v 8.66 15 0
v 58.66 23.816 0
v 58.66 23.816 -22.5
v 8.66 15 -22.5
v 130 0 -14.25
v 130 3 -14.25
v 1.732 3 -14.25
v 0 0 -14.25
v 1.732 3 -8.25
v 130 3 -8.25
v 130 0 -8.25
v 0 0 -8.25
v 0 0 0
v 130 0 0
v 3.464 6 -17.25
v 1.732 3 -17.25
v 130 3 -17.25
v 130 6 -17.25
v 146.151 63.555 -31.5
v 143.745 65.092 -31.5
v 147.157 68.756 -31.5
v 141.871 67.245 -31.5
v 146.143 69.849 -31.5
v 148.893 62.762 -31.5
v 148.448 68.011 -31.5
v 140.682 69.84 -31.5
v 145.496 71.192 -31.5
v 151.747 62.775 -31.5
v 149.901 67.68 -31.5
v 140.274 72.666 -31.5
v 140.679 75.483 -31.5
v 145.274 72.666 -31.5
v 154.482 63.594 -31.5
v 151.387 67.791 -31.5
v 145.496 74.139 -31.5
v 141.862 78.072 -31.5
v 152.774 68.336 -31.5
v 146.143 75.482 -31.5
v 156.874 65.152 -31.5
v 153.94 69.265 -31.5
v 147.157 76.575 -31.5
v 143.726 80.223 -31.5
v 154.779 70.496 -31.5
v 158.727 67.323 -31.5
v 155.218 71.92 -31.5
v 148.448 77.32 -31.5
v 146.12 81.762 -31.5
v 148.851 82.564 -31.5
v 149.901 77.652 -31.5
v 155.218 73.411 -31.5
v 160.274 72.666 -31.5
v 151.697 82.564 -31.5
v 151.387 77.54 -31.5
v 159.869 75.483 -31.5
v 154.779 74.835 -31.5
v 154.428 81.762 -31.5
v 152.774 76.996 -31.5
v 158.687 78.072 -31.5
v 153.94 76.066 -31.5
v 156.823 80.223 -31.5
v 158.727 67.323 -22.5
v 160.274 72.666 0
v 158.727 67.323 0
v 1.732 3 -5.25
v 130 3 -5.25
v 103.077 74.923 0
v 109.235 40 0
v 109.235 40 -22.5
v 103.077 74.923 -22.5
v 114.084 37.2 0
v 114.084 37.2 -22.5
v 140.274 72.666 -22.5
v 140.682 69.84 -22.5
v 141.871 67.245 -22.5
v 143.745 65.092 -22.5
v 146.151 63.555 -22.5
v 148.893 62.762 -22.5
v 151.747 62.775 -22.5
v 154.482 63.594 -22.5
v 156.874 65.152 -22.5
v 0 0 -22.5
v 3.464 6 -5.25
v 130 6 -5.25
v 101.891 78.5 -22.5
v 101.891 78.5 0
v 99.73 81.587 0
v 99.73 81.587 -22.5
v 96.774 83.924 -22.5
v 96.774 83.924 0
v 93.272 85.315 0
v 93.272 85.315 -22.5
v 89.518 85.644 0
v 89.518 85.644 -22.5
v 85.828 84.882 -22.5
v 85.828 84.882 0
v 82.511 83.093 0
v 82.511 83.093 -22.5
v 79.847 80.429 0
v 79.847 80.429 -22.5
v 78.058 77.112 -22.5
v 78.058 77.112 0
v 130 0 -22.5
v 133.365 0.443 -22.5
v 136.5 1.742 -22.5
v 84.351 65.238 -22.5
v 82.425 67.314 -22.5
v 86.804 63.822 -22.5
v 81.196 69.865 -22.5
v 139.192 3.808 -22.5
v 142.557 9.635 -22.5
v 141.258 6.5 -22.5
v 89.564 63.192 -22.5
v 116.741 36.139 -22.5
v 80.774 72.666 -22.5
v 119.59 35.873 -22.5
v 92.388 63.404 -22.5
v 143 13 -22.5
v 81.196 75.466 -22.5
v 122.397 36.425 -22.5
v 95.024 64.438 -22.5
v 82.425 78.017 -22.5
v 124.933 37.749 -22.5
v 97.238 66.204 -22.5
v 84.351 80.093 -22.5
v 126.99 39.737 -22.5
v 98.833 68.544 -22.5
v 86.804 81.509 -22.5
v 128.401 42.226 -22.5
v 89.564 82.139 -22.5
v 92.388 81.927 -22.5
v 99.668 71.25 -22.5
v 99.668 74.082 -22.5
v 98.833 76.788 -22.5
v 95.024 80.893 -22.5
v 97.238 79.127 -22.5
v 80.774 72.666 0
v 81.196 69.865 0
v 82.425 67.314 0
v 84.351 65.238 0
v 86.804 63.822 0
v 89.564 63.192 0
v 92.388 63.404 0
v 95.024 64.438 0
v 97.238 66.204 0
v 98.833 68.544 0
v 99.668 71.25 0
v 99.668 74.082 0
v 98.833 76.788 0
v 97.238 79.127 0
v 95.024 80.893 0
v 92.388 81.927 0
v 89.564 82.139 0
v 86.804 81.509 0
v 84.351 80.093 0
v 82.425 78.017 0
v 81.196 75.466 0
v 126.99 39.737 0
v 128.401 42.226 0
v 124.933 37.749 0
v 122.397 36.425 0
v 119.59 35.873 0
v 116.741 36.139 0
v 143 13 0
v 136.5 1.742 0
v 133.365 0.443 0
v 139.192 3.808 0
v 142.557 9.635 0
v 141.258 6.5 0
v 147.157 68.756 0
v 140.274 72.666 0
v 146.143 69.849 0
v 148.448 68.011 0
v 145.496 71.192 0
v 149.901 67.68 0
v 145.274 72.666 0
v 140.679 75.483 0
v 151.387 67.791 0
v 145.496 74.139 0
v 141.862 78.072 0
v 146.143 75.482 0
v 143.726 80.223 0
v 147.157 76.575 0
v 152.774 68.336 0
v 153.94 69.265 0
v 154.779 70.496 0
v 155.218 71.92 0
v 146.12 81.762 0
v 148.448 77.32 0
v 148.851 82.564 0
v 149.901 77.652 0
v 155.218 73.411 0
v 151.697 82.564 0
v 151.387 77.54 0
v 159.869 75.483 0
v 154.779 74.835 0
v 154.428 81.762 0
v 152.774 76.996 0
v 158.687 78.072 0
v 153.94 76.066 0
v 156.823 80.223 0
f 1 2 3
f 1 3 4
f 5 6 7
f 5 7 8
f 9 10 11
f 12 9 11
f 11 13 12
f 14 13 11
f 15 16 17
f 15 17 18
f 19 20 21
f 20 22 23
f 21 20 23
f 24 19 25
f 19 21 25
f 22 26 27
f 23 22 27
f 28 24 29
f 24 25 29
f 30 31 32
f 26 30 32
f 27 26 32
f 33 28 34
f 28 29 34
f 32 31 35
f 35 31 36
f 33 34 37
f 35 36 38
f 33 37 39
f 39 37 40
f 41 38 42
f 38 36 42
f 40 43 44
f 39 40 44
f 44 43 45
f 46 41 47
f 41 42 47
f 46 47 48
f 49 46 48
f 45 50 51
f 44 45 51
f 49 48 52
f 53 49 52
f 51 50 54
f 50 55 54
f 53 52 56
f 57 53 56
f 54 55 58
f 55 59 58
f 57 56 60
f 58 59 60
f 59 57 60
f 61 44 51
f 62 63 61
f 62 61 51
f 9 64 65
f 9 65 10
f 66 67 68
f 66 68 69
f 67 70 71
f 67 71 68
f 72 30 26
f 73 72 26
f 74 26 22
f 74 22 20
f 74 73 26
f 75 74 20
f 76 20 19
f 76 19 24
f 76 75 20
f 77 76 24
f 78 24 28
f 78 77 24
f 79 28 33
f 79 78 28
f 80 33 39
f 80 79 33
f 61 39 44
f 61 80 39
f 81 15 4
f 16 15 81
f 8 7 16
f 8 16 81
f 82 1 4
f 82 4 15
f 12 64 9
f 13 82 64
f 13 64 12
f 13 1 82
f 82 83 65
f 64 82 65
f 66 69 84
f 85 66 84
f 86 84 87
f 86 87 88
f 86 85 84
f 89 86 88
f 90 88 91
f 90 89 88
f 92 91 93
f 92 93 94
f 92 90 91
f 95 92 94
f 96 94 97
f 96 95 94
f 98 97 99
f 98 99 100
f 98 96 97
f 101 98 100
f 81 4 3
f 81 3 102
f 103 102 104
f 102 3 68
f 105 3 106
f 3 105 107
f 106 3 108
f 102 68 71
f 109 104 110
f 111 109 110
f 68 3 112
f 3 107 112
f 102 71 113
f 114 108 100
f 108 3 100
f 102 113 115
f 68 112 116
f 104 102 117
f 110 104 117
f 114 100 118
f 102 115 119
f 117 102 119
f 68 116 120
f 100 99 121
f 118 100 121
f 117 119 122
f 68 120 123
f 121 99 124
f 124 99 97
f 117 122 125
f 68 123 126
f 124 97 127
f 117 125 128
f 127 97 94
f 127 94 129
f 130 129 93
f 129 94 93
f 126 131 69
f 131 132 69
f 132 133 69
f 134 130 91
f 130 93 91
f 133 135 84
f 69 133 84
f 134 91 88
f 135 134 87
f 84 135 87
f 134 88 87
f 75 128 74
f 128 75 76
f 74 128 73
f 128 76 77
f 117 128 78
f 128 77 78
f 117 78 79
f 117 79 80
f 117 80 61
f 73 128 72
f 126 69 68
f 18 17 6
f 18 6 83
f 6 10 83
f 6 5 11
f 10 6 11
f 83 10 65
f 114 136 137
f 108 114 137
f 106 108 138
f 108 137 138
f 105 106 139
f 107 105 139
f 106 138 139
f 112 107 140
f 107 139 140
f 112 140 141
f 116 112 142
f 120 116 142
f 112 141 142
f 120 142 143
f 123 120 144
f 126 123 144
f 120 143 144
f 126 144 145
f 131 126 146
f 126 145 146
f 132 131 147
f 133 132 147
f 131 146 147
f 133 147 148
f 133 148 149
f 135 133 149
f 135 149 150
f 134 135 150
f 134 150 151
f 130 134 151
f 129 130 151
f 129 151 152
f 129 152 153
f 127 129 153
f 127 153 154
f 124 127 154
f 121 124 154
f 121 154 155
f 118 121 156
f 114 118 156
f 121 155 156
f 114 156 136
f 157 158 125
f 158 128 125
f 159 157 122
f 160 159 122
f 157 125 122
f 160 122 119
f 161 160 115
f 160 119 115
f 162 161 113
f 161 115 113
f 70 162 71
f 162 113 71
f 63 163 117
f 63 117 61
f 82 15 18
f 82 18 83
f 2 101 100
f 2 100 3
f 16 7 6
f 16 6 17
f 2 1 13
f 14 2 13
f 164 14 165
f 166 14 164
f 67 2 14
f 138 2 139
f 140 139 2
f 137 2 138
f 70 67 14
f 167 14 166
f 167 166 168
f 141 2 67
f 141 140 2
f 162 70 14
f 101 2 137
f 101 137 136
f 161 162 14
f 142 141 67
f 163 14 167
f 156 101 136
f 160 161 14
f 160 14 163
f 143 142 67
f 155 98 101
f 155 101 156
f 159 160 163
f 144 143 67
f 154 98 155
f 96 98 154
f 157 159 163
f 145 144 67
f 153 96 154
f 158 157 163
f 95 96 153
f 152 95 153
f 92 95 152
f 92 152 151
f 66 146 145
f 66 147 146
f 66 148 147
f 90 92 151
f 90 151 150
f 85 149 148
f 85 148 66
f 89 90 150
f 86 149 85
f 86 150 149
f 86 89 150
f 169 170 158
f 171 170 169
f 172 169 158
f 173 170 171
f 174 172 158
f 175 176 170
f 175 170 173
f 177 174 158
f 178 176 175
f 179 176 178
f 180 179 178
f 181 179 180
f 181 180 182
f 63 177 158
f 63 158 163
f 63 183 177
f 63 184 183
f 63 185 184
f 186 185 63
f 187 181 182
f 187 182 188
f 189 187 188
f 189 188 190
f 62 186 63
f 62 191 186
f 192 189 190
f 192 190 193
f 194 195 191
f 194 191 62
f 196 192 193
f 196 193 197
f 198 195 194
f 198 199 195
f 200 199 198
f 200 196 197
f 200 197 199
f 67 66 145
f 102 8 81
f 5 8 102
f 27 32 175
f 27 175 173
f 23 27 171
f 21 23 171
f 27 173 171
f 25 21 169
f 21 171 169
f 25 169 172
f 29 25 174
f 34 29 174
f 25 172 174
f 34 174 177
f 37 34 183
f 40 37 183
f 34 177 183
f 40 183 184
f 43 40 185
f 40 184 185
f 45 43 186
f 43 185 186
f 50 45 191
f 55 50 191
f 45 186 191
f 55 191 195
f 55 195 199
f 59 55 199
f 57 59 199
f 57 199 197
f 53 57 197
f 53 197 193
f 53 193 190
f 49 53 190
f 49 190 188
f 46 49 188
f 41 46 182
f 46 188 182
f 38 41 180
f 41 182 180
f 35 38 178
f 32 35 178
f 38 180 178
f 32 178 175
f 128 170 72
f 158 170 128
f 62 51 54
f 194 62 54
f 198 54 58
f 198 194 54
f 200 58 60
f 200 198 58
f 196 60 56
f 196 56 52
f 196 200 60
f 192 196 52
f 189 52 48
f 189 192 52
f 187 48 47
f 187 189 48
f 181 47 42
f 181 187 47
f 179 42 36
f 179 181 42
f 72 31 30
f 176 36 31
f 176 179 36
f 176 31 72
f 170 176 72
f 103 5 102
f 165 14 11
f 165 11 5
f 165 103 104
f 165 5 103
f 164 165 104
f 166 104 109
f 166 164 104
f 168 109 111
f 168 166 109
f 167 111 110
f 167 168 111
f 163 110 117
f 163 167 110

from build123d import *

# Parameters (mm, degrees)
SKETCH1_R           = 13
SKETCH1_R_2         = 9.5
SKETCH1_R_3         = 5
BOSS_EXTRUDE1_DEPTH = 22.5
SKETCH6_W           = 3
SKETCH6_H           = 3
CUT_EXTRUDE2_DEPTH  = 130
FILLET1_R           = 10
SKETCH7_R           = 5
BOSS_EXTRUDE2_DEPTH = 9


with BuildPart() as part:
    # Sketch1 → Boss-Extrude1 (new body)
    # profile 1 of 7: a face of its own
    with BuildSketch(Plane.XY):
        with BuildLine():
            ThreePointArc((103.274249999, 72.665631876), (88.01682369, 59.863131087), (78.058245929, 77.11189374))
            Line((78.058245929, 77.11189374), (58.660254038, 23.816349035))
            Line((58.660254038, 23.816349035), (8.660254038, 15))
            Line((8.660254038, 15), (0, 0))
            Line((0, 0), (130, 0))
            ThreePointArc((130, 0), (120.807611845, 3.807611845), (117, 13))
            ThreePointArc((117, 13), (117.888810571, 17.724308479), (120.433706247, 21.802614602))
            Line((120.433706247, 21.802614602), (124.168764572, 31.377772343))
            Line((124.168764572, 31.377772343), (109.234628196, 40))
            Line((109.234628196, 40), (103.076750789, 74.923058186))
            ThreePointArc((103.076750789, 74.923058186), (103.224781075, 73.798656532), (103.274249999, 72.665631876))
        make_face()
    # profile 2 of 7: a face of its own
    with BuildSketch(Plane.XY):
        with Locations((90.274249999, 72.665631876)):
            Circle(SKETCH1_R)
        with Locations(Location((90.274249999, 72.665631876, 0), (0, 0, 180))):
            Circle(SKETCH1_R_2, mode=Mode.SUBTRACT)
    # profile 3 of 7: a face of its own
    with BuildSketch(Plane.XY):
        with BuildLine():
            Line((136.5, 24.258330249), (124.168764572, 31.377772343))
            Line((124.168764572, 31.377772343), (120.433706247, 21.802614602))
            ThreePointArc((120.433706247, 21.802614602), (128.035776443, 25.850751955), (136.5, 24.258330249))
        make_face()
    # profile 4 of 7: a face of its own
    with BuildSketch(Plane.XY):
        with BuildLine():
            ThreePointArc((117, 13), (120.807611845, 3.807611845), (130, 0))
            ThreePointArc((130, 0), (139.192388155, 3.807611845), (143, 13))
            ThreePointArc((143, 13), (141.258330249, 19.5), (136.5, 24.258330249))
            ThreePointArc((136.5, 24.258330249), (128.035776443, 25.850751955), (120.433706247, 21.802614602))
            Line((120.433706247, 21.802614602), (117, 13))
        make_face()
    # profile 5 of 7: a face of its own
    with BuildSketch(Plane.XY):
        with BuildLine():
            Line((117, 13), (120.433706247, 21.802614602))
            ThreePointArc((120.433706247, 21.802614602), (117.888810571, 17.724308479), (117, 13))
        make_face()
    # profile 6 of 7: a face of its own
    with BuildSketch(Plane.XY):
        with BuildLine():
            Line((140.274249999, 72.665631876), (124.168764572, 31.377772343))
            Line((124.168764572, 31.377772343), (136.5, 24.258330249))
            ThreePointArc((136.5, 24.258330249), (141.258330249, 19.5), (143, 13))
            Line((143, 13), (158.72749128, 67.323093917))
            ThreePointArc((158.72749128, 67.323093917), (147.493280097, 63.060101886), (140.274249999, 72.665631876))
        make_face()
    # profile 7 of 7: a face of its own
    with BuildSketch(Plane.XY):
        with BuildLine():
            ThreePointArc((160.274249999, 72.665631876), (150.274249999, 82.665631876), (140.274249999, 72.665631876))
            ThreePointArc((140.274249999, 72.665631876), (147.493280097, 63.060101886), (158.72749128, 67.323093917))
            Line((158.72749128, 67.323093917), (160.274249999, 72.665631876))
        make_face()
        with Locations(Location((150.274249999, 72.665631876, 0), (0, 0, 180))):
            Circle(SKETCH1_R_3, mode=Mode.SUBTRACT)
    extrude(amount=BOSS_EXTRUDE1_DEPTH)

    # Sketch6 → Cut-Extrude2 (cut)
    with BuildSketch(Plane(origin=(0, 0, 0), x_dir=(0, 0, -1), z_dir=(-1, 0, 0))):
        with Locations((-9.75, -1.5)):
            Rectangle(SKETCH6_W, SKETCH6_H)
        Polygon((-8.25, -3), (-11.25, -3), (-11.25, -6), (-5.25, -6), (-5.25, -3), align=None)
        with Locations((-12.75, -1.5)):
            Rectangle(SKETCH6_W, SKETCH6_H)
        Polygon((-11.25, -3), (-14.25, -3), (-17.25, -3), (-17.25, -6), (-11.25, -6), align=None)
    extrude(amount=-CUT_EXTRUDE2_DEPTH, mode=Mode.SUBTRACT)

    # Fillet1
    fillet1_edges = [part.edges().sort_by_distance(p)[0] for p in [
        (124.168764572, 31.377772343, 11.25),
    ]]
    fillet(fillet1_edges, radius=FILLET1_R)

    # Sketch7 → Boss-Extrude2 (add)
    with BuildSketch(Plane.XY.offset(22.5)):
        with BuildLine():
            Line((158.72749128, 67.323093917), (160.274249999, 72.665631876))
            ThreePointArc((160.274249999, 72.665631876), (150.274249999, 82.665631876), (140.274249999, 72.665631876))
            ThreePointArc((140.274249999, 72.665631876), (147.493280097, 63.060101886), (158.72749128, 67.323093917))
        make_face()
        with Locations(Location((150.274249999, 72.665631876, 0), (0, 0, 180))):
            Circle(SKETCH7_R, mode=Mode.SUBTRACT)
    extrude(amount=BOSS_EXTRUDE2_DEPTH)


with BuildPart() as body_2:
    # Mirror1: mirrored copy
    add(part.part.mirror(Plane.XY))


solid = body_2.part
